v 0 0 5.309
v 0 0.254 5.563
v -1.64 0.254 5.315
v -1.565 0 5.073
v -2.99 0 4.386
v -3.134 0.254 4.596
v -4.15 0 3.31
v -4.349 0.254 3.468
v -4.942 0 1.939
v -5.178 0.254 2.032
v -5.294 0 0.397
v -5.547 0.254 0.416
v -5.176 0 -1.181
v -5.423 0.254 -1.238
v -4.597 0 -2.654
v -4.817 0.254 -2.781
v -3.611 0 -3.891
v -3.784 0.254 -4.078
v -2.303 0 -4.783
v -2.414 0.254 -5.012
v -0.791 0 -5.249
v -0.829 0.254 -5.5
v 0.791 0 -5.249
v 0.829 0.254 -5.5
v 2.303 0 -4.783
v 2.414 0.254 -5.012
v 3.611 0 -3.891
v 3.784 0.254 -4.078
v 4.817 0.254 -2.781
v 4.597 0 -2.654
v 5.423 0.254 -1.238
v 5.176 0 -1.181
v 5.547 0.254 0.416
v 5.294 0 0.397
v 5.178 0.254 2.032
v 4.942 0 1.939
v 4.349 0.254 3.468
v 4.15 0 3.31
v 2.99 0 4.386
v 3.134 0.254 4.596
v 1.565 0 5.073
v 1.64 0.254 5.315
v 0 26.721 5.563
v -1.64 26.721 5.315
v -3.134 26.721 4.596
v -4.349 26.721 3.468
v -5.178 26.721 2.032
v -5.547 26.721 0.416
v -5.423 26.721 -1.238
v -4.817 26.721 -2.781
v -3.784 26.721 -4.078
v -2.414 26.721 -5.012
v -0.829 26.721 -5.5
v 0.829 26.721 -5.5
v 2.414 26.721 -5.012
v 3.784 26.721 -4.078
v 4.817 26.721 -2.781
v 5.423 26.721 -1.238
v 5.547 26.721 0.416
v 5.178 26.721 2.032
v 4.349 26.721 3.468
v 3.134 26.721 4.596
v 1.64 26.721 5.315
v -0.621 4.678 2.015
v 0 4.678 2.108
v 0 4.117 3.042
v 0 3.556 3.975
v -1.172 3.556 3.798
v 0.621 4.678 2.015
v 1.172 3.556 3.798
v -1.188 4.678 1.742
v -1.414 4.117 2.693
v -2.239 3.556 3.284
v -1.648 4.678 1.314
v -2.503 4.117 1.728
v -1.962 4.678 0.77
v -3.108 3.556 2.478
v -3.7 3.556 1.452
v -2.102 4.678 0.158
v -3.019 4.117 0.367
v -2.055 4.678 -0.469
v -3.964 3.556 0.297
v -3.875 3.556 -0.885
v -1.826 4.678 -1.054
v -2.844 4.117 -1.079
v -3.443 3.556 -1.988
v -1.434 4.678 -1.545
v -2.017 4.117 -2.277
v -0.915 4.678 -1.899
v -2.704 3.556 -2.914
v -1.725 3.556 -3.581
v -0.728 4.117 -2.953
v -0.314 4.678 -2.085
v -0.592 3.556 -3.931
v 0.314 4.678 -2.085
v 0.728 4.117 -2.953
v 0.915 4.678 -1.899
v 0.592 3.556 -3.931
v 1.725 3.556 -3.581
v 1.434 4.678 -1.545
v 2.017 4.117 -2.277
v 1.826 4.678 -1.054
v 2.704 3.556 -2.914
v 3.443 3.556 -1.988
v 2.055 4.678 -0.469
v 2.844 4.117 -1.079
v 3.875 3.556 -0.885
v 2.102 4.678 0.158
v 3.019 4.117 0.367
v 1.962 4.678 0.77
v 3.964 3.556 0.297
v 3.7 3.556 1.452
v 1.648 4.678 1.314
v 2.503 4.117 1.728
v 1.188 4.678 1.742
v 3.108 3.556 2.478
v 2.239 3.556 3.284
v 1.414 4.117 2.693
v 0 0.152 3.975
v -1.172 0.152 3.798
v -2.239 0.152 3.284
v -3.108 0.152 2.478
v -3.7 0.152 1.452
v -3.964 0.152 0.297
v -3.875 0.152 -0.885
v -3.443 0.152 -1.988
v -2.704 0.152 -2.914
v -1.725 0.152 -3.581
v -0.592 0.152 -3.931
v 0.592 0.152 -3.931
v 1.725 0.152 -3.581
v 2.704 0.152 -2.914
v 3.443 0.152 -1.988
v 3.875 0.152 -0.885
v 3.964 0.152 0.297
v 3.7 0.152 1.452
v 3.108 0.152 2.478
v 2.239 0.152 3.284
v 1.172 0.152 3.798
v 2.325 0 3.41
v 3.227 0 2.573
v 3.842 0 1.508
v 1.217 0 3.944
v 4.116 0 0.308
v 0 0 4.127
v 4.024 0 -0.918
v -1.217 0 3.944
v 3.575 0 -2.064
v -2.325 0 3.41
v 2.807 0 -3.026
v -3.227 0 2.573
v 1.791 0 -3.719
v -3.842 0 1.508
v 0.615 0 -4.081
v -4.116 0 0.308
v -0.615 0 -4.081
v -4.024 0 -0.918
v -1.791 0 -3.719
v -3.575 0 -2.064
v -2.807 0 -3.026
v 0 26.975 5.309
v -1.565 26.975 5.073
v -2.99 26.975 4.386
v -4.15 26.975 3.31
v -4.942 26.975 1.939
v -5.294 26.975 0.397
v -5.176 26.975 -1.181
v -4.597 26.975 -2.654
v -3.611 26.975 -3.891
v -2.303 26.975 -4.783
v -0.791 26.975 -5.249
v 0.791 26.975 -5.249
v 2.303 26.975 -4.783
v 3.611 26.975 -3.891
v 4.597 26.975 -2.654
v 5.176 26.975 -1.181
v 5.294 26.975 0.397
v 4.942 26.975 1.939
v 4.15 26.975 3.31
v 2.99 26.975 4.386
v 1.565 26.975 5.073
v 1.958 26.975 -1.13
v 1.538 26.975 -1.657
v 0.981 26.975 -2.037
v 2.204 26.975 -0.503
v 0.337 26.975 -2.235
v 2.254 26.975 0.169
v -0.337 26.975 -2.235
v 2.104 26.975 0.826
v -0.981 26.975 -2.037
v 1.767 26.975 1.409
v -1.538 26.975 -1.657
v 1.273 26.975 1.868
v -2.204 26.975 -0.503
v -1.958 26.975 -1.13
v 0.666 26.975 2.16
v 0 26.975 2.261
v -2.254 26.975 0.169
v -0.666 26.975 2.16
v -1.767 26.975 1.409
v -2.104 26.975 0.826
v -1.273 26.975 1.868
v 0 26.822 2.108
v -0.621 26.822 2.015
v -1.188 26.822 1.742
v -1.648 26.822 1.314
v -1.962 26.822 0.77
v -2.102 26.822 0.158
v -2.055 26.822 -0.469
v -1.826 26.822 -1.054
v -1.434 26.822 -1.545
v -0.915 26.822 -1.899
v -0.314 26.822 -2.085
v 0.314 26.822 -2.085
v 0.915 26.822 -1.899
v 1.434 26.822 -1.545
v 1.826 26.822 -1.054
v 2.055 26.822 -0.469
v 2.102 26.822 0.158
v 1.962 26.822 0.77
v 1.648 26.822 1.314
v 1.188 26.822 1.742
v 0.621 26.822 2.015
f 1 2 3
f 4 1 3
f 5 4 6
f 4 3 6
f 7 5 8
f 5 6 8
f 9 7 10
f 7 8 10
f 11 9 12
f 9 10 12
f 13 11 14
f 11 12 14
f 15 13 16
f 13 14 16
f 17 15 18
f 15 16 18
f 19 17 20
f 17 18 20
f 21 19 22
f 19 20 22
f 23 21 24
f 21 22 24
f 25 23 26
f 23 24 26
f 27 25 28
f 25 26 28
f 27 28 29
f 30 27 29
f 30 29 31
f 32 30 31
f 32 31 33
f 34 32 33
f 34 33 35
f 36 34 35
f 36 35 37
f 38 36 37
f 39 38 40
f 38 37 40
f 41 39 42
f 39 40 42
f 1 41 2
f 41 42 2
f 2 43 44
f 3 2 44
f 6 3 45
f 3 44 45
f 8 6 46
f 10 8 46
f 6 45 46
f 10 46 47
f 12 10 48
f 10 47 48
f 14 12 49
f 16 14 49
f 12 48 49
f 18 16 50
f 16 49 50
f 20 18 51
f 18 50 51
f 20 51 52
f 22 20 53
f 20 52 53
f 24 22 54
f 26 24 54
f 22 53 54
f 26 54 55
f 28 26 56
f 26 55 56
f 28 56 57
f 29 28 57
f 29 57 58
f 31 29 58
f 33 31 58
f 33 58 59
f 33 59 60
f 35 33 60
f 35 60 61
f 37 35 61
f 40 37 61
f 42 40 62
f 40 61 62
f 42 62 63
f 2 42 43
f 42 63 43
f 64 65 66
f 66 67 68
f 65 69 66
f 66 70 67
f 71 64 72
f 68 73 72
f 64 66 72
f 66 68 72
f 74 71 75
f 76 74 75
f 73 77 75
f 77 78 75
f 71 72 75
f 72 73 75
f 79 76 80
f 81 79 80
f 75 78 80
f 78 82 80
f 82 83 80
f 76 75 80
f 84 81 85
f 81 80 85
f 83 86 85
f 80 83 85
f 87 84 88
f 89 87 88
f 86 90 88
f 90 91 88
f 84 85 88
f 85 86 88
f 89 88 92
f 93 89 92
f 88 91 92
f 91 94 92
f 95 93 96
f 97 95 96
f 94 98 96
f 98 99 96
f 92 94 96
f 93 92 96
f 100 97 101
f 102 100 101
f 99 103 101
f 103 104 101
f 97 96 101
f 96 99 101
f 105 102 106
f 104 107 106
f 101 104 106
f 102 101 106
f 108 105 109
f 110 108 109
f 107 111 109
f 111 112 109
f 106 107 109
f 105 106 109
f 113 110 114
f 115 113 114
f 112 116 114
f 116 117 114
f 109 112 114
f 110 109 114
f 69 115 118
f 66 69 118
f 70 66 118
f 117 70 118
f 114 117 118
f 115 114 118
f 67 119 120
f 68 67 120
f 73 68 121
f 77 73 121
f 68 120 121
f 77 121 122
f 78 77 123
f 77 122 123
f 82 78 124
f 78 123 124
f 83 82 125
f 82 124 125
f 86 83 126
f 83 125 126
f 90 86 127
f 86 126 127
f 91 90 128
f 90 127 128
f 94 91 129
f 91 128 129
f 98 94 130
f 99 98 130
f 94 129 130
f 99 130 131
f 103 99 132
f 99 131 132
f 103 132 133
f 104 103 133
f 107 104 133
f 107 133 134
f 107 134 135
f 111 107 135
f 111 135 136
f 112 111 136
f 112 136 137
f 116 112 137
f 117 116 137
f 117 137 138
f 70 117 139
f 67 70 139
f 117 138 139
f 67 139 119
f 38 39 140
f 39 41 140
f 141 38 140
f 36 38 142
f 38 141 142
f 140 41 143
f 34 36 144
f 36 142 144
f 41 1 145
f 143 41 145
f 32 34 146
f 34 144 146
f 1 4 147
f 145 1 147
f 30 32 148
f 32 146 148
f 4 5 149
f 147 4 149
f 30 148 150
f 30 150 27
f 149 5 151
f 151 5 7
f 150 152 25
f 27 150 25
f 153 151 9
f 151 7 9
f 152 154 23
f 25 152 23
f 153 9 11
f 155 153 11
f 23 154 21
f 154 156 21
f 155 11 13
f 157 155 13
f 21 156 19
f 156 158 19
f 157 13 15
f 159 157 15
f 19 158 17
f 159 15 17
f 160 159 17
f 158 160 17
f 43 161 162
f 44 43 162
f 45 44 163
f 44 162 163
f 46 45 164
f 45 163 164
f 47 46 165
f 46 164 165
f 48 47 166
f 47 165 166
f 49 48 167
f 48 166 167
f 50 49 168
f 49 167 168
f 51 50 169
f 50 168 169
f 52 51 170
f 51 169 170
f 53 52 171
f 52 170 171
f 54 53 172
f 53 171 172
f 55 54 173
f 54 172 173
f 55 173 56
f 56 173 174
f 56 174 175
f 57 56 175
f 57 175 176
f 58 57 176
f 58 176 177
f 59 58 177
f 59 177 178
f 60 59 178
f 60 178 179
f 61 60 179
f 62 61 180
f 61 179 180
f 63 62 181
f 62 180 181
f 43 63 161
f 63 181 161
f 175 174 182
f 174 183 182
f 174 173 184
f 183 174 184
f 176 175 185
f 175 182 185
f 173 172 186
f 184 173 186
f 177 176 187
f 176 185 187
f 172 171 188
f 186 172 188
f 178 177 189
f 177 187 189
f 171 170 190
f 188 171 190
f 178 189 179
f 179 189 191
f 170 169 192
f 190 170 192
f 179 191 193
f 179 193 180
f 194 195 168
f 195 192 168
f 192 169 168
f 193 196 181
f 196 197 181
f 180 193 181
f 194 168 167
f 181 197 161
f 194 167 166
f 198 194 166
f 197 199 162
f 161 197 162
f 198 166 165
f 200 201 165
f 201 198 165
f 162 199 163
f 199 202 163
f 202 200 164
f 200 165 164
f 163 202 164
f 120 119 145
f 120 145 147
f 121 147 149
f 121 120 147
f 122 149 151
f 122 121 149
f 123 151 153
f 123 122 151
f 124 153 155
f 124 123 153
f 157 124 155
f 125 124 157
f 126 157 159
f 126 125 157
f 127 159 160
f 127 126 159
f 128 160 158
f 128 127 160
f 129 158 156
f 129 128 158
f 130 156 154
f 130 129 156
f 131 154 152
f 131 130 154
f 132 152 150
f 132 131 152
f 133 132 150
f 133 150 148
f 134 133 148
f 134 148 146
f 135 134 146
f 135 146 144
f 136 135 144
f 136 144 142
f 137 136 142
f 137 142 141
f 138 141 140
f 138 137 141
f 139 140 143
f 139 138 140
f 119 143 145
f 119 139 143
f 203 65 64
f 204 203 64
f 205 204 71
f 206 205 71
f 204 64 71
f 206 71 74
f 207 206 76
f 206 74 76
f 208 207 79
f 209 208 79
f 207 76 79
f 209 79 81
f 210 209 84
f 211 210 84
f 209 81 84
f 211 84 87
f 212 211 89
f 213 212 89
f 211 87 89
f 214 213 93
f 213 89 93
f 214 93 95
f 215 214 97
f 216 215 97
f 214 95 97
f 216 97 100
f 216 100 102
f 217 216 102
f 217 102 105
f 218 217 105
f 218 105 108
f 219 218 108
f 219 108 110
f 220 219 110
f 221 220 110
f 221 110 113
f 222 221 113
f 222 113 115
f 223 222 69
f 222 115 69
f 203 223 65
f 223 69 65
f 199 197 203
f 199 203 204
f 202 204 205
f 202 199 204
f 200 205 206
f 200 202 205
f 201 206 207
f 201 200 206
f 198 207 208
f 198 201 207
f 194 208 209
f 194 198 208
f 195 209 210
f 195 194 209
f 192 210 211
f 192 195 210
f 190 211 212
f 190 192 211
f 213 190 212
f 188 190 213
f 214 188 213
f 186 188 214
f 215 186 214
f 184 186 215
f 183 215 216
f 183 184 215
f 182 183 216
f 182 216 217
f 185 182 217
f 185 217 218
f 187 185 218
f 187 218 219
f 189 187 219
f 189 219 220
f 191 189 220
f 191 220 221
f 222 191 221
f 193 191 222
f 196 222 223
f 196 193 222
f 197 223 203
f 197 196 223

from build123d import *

# Parameters (mm, degrees)
CHAMFER1_SIZE = 0.254
CHAMFER2_SIZE = 0.1524


with BuildPart() as part:
    # Sketch1 → Revolve1 (revolve)
    with BuildSketch(Plane(origin=(0, 0, 0), x_dir=(0, 0, -1), z_dir=(1, 0, 0)), mode=Mode.PRIVATE) as revolve1_sk:
        Polygon((3.9751, 0), (5.5626, 0), (5.5626, 26.9748), (2.1082, 26.9748), (2.1082, 4.67774669), (3.9751, 3.556), align=None)
    revolve(revolve1_sk.sketch.rotate(Axis((0, -4.141094848, 0), (0, -1, 0)), 180), axis=Axis((0, -4.141094848, 0), (0, -1, 0)))

    # Chamfer1
    chamfer1_edges = [part.edges().sort_by_distance(p)[0] for p in [
        (0, 26.9748, -5.5626),
        (0, 0, -5.5626),
    ]]
    chamfer(chamfer1_edges, length=CHAMFER1_SIZE)

    # Chamfer2
    chamfer2_edges = [part.edges().sort_by_distance(p)[0] for p in [
        (0, 26.9748, -2.1082),
        (0, 0, -3.9751),
    ]]
    chamfer(chamfer2_edges, length=CHAMFER2_SIZE)


solid = part.part
